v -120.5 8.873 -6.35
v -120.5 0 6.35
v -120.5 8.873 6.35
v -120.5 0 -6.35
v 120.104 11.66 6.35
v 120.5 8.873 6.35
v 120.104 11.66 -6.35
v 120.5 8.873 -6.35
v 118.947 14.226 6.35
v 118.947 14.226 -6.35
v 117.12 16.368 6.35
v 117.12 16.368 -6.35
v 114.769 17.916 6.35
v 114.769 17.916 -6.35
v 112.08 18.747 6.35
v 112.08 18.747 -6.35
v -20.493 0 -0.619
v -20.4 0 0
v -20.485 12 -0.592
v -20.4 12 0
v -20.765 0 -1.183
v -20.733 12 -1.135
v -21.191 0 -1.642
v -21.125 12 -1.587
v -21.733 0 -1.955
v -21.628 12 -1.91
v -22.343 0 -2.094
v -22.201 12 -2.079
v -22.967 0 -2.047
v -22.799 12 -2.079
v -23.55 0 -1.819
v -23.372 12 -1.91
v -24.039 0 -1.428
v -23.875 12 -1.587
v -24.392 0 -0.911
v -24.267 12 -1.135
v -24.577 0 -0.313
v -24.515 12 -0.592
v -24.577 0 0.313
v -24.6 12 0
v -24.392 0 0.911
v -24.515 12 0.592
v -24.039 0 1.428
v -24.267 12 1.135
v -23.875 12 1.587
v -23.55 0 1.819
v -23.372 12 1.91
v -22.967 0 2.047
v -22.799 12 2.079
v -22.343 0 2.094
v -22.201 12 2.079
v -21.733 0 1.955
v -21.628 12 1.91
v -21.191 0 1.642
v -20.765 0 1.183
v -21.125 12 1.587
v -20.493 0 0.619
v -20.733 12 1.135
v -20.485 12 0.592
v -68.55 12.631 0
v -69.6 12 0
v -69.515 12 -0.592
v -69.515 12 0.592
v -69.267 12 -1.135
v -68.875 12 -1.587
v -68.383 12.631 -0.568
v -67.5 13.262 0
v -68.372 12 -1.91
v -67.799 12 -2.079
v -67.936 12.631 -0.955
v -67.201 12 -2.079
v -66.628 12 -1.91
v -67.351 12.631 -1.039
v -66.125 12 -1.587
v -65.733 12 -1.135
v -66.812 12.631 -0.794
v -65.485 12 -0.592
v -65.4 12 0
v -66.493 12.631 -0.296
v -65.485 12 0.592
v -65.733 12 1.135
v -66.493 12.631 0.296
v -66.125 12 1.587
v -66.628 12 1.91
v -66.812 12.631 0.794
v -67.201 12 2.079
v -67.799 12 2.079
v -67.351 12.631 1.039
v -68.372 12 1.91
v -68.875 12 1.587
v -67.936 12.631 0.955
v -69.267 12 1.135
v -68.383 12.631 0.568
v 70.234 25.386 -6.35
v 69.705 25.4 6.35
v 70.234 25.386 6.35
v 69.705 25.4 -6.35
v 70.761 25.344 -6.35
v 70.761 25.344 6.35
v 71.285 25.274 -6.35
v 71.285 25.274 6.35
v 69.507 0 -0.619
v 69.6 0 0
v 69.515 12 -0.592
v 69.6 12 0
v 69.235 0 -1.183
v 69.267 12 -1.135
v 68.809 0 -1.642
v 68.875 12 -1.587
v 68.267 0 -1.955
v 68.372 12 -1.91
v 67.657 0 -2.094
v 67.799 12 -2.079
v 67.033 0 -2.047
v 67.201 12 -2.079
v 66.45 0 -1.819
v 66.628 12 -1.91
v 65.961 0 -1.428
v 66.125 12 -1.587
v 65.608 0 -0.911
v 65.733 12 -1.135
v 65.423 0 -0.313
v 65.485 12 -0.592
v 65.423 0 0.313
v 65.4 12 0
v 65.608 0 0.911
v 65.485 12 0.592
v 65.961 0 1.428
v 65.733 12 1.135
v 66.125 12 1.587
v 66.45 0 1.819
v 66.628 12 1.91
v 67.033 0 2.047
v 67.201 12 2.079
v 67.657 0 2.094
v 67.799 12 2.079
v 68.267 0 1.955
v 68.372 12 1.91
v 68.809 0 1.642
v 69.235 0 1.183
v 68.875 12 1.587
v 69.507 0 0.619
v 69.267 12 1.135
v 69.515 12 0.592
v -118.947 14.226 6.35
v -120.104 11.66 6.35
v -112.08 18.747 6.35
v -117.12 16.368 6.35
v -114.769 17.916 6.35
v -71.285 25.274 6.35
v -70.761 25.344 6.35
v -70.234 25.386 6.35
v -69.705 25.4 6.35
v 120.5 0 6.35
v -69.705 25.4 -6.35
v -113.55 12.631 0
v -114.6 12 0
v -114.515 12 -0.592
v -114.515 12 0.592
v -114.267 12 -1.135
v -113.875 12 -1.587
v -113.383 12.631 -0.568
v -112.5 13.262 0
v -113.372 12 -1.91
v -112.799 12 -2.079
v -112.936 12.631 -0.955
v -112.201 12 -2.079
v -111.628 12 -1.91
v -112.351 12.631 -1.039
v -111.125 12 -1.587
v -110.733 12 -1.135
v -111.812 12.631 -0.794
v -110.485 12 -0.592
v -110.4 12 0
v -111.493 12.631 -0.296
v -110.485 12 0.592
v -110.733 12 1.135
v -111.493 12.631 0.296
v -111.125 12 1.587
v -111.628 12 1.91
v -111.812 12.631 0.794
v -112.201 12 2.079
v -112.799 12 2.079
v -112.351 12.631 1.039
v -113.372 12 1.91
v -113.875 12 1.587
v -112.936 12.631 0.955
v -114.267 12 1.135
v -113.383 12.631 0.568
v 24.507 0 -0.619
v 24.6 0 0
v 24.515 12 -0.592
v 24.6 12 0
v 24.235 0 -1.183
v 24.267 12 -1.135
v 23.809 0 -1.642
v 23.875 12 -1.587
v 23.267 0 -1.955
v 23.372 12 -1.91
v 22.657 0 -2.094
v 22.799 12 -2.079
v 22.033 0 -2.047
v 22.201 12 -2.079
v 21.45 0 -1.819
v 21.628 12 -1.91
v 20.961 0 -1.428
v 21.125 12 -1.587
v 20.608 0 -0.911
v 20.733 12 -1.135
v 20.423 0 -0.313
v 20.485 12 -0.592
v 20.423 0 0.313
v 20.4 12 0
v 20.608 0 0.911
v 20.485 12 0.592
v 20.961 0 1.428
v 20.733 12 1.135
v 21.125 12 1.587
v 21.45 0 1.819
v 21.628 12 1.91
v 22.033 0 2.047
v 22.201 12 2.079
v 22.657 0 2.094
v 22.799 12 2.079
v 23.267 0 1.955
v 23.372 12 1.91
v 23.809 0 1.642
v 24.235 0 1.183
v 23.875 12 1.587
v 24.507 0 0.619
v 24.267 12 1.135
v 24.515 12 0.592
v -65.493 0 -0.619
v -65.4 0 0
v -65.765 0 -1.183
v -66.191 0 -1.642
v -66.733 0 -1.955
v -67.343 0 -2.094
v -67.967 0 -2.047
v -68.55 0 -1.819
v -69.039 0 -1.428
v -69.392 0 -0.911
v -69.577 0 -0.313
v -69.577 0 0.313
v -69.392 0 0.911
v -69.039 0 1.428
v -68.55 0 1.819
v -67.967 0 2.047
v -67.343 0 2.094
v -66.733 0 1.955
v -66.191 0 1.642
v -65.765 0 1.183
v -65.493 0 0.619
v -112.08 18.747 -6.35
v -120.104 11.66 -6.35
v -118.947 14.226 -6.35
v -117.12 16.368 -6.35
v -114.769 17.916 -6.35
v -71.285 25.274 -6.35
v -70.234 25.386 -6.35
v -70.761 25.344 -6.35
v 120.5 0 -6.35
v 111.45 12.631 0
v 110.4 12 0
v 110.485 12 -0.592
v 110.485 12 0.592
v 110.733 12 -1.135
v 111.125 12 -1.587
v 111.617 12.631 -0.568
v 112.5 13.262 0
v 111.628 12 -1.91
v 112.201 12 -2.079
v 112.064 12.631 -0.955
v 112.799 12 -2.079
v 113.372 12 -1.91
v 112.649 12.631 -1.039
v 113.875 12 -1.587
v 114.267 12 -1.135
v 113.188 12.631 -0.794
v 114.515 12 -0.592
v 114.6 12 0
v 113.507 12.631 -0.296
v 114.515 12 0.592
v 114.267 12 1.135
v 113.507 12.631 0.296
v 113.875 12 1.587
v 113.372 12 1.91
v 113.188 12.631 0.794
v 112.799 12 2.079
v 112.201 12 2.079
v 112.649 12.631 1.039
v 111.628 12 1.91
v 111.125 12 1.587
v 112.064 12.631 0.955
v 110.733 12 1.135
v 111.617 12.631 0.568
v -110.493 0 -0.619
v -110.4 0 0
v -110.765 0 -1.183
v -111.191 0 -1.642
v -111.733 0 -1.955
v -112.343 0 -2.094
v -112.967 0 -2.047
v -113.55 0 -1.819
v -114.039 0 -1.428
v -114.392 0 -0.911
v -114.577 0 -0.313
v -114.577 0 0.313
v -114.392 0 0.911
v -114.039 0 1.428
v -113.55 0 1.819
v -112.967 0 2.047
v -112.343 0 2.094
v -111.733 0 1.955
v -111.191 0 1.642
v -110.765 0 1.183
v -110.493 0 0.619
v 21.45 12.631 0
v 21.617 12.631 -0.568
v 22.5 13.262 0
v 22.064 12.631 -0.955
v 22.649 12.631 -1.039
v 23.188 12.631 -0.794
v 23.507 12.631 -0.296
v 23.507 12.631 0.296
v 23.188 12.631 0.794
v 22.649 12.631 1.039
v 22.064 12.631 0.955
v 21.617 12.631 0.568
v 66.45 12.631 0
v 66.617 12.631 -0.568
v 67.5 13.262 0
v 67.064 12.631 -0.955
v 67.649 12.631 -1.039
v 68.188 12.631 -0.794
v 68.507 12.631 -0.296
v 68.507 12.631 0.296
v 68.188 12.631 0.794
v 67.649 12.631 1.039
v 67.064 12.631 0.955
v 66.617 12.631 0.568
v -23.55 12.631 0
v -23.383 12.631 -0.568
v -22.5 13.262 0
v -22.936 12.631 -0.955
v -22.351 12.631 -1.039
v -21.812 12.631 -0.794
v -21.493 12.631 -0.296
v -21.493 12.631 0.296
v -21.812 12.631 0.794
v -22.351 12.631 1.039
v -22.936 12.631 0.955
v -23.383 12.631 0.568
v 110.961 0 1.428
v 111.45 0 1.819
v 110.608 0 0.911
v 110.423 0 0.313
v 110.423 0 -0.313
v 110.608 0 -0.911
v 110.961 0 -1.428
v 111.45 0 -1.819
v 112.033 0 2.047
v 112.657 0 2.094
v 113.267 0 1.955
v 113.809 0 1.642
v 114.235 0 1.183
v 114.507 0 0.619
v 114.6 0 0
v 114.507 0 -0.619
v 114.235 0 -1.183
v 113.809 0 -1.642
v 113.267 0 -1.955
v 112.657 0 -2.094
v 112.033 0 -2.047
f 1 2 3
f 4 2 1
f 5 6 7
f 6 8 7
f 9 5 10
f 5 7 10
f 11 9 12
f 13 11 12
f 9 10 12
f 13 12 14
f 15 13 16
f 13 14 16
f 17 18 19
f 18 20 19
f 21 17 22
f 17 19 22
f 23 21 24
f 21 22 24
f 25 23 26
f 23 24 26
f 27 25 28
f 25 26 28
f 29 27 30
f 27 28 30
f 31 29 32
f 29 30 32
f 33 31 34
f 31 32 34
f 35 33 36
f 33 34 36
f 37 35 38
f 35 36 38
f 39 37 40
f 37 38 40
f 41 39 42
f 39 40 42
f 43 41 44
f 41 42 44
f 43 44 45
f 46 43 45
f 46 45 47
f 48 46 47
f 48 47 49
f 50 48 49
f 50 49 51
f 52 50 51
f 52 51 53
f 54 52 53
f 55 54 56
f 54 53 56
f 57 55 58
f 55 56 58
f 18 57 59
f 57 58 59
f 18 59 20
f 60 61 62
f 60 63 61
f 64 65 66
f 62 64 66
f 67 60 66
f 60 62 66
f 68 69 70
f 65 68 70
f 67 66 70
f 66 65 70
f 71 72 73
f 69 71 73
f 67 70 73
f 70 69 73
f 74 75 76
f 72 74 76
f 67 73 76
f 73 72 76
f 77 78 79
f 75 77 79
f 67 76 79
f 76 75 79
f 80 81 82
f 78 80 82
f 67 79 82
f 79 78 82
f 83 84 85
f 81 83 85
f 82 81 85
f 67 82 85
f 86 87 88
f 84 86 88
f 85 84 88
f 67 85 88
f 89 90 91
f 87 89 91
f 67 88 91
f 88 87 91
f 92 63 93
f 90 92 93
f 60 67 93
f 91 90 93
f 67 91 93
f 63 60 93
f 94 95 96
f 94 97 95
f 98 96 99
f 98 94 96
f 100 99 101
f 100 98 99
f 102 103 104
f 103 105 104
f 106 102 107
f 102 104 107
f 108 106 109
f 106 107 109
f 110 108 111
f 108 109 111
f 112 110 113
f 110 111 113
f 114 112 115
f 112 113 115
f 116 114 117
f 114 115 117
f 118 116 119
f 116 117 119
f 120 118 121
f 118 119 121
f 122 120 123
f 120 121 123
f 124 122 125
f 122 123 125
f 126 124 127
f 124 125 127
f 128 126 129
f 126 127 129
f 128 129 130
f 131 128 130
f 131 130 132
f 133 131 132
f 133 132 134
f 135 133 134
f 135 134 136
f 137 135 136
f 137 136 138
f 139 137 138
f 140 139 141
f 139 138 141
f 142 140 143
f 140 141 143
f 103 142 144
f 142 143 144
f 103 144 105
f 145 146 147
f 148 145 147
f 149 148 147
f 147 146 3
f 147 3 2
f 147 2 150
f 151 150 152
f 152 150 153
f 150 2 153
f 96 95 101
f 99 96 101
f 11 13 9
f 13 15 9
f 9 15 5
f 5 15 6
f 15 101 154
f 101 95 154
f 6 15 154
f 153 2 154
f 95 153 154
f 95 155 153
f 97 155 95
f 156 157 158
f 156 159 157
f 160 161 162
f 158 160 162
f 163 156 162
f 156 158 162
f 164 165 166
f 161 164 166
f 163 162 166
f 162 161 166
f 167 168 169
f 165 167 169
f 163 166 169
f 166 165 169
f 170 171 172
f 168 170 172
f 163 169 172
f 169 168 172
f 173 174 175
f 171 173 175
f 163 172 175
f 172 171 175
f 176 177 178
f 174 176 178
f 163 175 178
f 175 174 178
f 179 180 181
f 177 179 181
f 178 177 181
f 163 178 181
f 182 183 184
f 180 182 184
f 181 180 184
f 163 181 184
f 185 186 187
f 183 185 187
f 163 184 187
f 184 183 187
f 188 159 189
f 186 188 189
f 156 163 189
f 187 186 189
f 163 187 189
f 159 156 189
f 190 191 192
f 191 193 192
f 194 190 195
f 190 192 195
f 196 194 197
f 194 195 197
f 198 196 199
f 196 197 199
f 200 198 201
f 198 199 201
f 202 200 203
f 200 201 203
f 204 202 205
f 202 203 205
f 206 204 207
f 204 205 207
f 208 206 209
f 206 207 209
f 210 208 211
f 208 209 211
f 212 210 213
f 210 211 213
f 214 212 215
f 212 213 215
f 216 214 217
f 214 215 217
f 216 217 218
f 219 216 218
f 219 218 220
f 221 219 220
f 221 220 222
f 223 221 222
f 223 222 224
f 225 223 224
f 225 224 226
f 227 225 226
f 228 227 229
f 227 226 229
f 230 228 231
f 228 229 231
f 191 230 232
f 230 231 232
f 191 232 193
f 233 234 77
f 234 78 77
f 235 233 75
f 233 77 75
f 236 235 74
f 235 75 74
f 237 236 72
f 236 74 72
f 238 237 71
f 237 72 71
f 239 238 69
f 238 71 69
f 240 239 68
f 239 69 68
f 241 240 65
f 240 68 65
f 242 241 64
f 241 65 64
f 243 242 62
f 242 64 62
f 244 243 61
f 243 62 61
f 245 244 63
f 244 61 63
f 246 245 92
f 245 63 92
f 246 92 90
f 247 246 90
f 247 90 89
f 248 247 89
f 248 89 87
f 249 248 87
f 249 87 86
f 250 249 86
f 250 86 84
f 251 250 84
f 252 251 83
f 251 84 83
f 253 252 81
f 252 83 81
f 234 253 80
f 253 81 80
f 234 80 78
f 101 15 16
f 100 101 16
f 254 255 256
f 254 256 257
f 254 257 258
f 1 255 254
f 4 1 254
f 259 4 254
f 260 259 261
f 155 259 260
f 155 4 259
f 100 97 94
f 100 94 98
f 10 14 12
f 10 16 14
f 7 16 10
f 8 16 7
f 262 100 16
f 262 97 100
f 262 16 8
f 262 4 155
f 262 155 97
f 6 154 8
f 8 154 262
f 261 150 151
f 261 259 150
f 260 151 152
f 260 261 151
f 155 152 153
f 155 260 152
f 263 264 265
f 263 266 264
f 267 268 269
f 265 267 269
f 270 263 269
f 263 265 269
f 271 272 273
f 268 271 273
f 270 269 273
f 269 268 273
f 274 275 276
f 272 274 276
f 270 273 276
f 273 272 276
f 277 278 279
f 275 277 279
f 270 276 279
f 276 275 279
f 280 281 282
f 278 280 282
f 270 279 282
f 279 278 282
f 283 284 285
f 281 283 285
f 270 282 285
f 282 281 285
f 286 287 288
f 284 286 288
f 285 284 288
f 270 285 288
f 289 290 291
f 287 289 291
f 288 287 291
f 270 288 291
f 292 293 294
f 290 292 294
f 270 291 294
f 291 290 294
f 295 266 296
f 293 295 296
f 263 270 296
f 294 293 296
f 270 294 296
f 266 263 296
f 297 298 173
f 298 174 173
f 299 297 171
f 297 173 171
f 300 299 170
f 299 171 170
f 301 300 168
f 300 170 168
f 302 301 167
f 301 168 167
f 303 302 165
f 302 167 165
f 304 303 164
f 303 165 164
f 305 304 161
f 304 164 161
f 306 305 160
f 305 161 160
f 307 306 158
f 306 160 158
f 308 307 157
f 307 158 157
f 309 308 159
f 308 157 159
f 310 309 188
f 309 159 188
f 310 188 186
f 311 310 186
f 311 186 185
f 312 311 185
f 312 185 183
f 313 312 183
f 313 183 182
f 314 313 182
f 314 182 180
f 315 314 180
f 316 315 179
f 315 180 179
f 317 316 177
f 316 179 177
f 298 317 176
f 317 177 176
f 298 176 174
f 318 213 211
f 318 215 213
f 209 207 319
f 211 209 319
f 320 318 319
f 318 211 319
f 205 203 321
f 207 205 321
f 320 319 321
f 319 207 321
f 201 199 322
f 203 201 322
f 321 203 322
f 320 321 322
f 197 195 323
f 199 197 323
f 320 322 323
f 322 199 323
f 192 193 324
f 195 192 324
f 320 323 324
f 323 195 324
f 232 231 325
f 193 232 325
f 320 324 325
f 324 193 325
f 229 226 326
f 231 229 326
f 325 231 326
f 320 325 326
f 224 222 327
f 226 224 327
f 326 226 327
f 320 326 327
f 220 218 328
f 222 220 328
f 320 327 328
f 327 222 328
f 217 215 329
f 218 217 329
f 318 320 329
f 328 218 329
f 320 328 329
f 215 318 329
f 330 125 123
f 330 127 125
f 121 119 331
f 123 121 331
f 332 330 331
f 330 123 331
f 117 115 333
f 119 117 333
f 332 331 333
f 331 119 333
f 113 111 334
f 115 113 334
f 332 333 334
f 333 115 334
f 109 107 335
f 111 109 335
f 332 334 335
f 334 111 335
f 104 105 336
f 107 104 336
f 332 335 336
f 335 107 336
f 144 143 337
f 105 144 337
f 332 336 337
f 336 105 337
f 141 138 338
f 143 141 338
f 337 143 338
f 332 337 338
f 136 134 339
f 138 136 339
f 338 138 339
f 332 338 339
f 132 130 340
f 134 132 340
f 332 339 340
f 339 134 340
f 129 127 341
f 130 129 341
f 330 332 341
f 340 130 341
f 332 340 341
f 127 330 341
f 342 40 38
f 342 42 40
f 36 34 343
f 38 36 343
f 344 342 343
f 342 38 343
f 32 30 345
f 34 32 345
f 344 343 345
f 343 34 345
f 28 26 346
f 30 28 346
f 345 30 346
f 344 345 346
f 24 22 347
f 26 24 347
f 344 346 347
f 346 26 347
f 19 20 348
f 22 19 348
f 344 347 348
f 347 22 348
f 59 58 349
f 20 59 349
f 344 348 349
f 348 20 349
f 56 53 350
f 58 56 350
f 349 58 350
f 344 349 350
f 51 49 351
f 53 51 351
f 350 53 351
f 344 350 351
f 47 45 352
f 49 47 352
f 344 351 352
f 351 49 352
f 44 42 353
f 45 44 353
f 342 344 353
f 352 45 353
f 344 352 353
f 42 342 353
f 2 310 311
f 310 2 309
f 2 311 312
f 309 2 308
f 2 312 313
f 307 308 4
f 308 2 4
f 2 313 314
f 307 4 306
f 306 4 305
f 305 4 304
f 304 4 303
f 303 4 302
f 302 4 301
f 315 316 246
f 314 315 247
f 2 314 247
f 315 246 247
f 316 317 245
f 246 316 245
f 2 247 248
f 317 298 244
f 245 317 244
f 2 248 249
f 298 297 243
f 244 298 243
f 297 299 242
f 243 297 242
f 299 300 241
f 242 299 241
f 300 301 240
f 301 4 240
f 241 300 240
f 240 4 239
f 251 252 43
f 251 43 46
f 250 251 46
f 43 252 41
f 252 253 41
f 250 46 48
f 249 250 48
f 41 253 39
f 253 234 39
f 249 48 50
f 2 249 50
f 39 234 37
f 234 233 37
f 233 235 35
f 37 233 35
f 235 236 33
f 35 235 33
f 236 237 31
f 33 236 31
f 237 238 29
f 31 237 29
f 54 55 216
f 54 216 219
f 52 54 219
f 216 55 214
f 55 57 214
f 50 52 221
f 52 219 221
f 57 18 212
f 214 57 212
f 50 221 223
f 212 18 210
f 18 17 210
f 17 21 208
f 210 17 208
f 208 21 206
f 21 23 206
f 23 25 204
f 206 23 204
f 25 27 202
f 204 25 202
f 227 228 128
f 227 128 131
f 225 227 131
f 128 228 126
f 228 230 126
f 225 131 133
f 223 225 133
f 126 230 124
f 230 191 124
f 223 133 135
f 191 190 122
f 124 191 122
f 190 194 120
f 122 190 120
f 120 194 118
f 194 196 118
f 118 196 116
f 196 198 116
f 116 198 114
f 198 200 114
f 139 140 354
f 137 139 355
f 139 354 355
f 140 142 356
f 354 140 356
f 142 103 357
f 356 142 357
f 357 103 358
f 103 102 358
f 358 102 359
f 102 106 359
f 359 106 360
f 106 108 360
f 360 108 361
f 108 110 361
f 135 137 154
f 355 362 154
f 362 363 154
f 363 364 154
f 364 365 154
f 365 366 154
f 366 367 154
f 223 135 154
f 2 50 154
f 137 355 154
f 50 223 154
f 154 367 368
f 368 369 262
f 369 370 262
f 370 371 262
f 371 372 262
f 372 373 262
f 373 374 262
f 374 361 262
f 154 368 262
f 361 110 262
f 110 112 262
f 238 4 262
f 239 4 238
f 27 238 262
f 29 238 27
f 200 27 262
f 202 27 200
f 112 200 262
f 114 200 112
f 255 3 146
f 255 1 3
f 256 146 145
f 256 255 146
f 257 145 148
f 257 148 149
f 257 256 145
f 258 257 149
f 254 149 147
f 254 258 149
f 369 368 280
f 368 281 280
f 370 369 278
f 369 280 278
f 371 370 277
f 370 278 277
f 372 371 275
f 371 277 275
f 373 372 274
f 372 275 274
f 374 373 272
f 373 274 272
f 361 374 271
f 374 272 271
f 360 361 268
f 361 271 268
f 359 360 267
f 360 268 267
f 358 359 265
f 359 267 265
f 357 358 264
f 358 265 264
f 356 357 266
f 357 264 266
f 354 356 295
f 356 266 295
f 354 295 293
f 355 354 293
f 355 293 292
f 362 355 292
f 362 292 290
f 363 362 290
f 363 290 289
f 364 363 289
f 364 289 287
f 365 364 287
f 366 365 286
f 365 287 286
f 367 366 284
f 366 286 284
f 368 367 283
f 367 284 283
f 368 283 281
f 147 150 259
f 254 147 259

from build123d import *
from OCP.BRepFilletAPI import BRepFilletAPI_MakeChamfer

# Parameters (mm, degrees)
SKETCH1_W                 = 241
SKETCH1_H                 = 12.7
BOSS_EXTRUDE1_DEPTH       = 25.4
CHAMFER1_SIZE             = 8
CHAMFER1_SIZE2            = 50
M5X0_8_TAPPED_HOLE1_D     = 4.2
M5X0_8_TAPPED_HOLE1_DEPTH = 12
M5X0_8_TAPPED_HOLE1_TIP   = 1.2618073
FILLET1_R                 = 10


with BuildPart() as part:
    # Sketch1 → Boss-Extrude1 (new body)
    with BuildSketch(Plane(origin=(0, 0, 0), x_dir=(1, 0, 0), z_dir=(0, 1, 0))):
        Rectangle(SKETCH1_W, SKETCH1_H)
    extrude(amount=BOSS_EXTRUDE1_DEPTH)

    # Chamfer1: one chamfer whose edges measure the first distance from different faces: ONE call of the kernel's chamfer builder (chamfer() names one face for all edges)
    chamfer1_edges_1 = [part.edges().sort_by_distance(p)[0] for p in [
        (-120.5, 25.4, 0),
    ]]
    chamfer1_side_1 = [part.faces().sort_by_distance(p)[0] for p in [
        (-120.5, 12.7, 0),
    ]]
    chamfer1_edges_2 = [part.edges().sort_by_distance(p)[0] for p in [
        (120.5, 25.4, 0),
    ]]
    chamfer1_side_2 = [part.faces().sort_by_distance(p)[0] for p in [
        (120.5, 12.7, 0),
    ]]
    chamfer1 = BRepFilletAPI_MakeChamfer(part.part.solid().wrapped)
    for e in chamfer1_edges_1:
        chamfer1.Add(CHAMFER1_SIZE, CHAMFER1_SIZE2, e.wrapped, chamfer1_side_1[0].wrapped)  # the first distance lies on this face
    for e in chamfer1_edges_2:
        chamfer1.Add(CHAMFER1_SIZE, CHAMFER1_SIZE2, e.wrapped, chamfer1_side_2[0].wrapped)  # the first distance lies on this face
    add(Compound.cast(chamfer1.Shape()), mode=Mode.REPLACE)

    # M5x0.8 Tapped Hole1
    with Locations(Plane(origin=(0, 0, 0), x_dir=(-1, 0, 0), z_dir=(0, -1, 0))):
        with Locations((112.5, 0), (67.5, 0), (22.5, 0), (-22.5, 0), (-67.5, 0), (-112.5, 0)):
            Hole(M5X0_8_TAPPED_HOLE1_D / 2, depth=M5X0_8_TAPPED_HOLE1_DEPTH)
            with Locations((0, 0, -(M5X0_8_TAPPED_HOLE1_DEPTH + M5X0_8_TAPPED_HOLE1_TIP / 2))):  # 118° drill point
                Cone(0, M5X0_8_TAPPED_HOLE1_D / 2, M5X0_8_TAPPED_HOLE1_TIP, mode=Mode.SUBTRACT)

    # Fillet1
    fillet1_edges = [part.edges().sort_by_distance(p)[0] for p in [
        (-70.5, 25.4, 0),
        (70.5, 25.4, 0),
        (120.5, 17.4, 0),
        (-120.5, 17.4, 0),
    ]]
    fillet(fillet1_edges, radius=FILLET1_R)


solid = part.part
